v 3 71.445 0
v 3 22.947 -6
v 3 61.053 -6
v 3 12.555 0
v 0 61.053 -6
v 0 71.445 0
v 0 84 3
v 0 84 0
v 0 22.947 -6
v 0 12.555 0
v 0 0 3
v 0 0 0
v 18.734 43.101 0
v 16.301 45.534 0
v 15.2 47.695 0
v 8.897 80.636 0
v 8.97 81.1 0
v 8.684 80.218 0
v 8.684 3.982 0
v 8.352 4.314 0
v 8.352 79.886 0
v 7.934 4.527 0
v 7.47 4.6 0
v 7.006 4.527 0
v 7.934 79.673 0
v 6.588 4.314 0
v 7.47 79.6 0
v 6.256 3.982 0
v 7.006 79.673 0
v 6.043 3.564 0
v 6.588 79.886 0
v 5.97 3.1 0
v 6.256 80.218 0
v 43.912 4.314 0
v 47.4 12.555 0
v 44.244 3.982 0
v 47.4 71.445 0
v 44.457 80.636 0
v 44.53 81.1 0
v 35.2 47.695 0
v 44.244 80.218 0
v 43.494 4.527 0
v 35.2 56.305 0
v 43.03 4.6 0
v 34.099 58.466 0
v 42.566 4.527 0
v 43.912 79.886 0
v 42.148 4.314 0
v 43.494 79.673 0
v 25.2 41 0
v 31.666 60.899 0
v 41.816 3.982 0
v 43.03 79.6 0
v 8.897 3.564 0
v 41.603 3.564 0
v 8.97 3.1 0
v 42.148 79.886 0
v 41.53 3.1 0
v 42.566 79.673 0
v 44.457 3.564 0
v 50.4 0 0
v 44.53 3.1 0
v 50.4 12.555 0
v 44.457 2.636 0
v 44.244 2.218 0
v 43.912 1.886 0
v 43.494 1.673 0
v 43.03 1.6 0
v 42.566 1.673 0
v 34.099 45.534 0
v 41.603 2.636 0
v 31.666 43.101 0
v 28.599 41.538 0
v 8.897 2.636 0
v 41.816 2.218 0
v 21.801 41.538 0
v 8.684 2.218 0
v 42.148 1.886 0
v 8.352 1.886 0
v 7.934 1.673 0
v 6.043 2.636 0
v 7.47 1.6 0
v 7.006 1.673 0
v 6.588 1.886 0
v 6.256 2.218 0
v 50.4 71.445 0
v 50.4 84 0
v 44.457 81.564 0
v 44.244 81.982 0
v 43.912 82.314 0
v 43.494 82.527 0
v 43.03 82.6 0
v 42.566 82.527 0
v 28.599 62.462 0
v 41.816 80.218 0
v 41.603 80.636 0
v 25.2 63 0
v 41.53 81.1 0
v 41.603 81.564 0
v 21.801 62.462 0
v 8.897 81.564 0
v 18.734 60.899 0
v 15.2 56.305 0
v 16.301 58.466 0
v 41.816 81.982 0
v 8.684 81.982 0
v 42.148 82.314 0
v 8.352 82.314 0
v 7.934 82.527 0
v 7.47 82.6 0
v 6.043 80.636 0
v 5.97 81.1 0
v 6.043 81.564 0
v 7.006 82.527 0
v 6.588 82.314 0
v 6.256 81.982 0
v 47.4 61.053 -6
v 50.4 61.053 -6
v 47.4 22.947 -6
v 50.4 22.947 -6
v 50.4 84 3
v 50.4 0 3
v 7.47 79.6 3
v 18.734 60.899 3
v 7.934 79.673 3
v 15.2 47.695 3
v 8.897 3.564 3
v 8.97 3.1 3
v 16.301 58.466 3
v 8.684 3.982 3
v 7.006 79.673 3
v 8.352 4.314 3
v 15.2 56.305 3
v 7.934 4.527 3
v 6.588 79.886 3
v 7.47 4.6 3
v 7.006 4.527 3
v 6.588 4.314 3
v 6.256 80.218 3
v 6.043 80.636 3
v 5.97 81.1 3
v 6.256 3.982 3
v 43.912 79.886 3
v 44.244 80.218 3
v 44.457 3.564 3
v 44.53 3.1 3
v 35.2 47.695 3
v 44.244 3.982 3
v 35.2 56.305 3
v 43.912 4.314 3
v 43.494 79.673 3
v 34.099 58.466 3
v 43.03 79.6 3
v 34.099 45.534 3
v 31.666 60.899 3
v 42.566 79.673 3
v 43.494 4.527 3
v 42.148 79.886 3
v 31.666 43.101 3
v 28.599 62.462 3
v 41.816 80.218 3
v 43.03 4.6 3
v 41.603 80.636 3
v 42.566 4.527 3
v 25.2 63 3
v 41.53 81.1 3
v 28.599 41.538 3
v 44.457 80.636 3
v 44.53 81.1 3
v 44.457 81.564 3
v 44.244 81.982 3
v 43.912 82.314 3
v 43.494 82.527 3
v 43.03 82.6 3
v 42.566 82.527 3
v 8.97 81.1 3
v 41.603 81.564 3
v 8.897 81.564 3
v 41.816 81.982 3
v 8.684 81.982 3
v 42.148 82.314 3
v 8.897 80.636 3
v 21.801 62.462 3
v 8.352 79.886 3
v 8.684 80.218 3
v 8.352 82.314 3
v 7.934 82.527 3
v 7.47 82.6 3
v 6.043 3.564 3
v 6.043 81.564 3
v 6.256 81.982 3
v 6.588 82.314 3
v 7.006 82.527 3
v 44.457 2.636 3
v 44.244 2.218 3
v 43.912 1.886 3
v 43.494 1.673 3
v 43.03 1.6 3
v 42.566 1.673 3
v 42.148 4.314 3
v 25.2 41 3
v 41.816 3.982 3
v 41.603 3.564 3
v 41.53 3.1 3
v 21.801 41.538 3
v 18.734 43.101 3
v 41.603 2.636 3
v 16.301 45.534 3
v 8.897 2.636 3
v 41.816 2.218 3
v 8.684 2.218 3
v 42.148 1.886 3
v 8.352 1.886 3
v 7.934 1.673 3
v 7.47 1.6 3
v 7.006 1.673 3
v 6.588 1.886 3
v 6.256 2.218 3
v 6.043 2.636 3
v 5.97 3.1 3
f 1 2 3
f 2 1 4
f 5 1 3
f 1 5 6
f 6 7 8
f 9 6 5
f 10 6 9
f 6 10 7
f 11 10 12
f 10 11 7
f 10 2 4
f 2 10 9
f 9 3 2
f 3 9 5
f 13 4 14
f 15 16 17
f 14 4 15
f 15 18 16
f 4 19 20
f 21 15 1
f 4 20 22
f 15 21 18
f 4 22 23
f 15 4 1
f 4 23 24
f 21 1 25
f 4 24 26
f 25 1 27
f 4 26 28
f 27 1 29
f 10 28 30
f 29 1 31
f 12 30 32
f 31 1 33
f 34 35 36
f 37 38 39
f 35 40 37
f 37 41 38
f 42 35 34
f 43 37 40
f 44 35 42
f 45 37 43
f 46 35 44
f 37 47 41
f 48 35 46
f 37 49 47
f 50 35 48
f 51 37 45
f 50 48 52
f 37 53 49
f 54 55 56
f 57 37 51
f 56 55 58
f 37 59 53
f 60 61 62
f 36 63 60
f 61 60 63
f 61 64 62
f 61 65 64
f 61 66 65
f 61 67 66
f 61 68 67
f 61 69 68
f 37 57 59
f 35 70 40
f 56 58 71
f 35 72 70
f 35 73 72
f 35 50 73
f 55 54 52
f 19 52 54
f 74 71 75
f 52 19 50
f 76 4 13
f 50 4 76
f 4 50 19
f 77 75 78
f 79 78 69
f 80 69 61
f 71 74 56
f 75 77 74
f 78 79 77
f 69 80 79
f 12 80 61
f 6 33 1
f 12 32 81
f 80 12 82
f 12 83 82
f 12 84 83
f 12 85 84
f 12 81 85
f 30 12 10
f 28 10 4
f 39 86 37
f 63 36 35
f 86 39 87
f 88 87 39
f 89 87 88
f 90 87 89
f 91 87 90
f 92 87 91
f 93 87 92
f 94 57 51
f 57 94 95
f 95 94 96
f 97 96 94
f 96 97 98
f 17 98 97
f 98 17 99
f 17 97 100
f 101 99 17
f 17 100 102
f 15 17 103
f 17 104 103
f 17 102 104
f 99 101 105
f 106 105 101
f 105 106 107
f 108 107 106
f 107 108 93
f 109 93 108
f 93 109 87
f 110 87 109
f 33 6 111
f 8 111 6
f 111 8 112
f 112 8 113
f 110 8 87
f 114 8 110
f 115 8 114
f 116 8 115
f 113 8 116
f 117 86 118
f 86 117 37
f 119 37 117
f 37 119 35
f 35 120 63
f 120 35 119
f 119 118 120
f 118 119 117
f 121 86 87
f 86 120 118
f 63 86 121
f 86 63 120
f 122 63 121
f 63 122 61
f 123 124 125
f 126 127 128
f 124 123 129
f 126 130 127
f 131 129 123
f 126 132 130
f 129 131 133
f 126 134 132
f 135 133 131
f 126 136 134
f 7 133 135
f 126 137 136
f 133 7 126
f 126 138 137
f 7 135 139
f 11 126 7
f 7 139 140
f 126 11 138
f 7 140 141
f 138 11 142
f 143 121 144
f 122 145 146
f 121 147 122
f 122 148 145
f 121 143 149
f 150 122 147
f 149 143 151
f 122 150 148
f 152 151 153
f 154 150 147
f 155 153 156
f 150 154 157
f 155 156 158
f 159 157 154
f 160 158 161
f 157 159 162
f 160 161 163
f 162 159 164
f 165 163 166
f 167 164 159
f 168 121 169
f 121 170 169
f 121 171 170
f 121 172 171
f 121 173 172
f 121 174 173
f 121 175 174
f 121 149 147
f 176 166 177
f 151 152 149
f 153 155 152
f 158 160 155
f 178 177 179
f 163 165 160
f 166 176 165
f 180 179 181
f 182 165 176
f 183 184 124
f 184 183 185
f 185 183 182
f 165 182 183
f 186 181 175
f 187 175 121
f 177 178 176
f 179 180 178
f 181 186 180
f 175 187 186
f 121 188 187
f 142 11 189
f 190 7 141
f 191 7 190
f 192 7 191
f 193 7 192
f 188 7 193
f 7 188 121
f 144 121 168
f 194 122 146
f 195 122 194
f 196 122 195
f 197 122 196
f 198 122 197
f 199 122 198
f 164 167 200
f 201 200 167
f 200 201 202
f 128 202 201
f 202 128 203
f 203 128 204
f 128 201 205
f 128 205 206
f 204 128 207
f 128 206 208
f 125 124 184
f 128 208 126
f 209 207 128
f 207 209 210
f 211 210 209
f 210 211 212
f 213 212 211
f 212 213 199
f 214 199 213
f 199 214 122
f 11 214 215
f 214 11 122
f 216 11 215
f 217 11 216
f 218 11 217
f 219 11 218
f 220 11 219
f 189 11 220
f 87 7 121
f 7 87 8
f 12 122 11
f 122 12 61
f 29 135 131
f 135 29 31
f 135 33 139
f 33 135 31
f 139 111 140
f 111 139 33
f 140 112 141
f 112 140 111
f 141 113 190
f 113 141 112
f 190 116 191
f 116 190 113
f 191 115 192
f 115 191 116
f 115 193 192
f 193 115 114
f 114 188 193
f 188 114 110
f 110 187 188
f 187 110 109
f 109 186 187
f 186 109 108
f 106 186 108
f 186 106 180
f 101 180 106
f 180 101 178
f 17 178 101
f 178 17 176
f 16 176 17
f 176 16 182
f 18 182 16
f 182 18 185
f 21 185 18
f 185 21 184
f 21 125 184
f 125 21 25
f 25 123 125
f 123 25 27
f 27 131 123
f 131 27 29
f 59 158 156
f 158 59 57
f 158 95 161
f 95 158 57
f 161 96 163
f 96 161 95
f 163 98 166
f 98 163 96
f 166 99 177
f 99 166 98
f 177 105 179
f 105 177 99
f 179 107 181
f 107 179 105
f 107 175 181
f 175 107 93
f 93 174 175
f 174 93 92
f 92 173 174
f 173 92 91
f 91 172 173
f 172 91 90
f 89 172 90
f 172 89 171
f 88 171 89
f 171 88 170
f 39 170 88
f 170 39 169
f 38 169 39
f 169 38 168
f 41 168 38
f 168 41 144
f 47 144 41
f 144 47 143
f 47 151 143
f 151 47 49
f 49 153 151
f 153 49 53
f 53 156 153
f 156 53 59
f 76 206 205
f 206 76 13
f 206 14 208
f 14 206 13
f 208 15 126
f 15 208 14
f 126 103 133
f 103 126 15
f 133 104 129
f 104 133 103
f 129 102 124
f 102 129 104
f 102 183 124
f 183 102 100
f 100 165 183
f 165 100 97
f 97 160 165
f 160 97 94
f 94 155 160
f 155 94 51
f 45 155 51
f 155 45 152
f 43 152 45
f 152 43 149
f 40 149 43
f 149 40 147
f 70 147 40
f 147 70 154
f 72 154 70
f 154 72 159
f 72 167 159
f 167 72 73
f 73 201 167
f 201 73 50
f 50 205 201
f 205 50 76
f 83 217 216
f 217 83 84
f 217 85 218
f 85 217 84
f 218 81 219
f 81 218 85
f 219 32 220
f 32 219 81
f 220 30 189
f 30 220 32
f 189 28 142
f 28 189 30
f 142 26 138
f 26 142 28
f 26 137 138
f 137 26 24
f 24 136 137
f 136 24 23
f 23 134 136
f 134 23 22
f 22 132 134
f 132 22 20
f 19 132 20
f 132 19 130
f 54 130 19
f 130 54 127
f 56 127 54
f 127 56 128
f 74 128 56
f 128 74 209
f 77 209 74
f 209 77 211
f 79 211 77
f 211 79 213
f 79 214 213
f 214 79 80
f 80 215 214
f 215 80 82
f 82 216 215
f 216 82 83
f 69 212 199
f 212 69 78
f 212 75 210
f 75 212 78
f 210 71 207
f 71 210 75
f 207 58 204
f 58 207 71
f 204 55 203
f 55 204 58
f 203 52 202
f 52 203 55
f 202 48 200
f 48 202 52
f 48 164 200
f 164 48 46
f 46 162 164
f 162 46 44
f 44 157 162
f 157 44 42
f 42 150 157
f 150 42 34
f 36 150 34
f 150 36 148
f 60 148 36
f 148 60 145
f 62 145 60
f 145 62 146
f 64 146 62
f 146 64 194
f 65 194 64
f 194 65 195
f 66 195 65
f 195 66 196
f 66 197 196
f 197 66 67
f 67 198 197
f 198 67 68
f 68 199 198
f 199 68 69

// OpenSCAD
// file: panel.scad
$fn = 20;
U = 3;
T = 16;

h = U * 44.5 - 5;
w = T * 5.08 - 2*.2;

m_x = 7.47;
//m_x = 0;
m_y = 3.1;
m_d = 3;

F = U * 44.5 + (122.5 - 3 * 44.5);

echo(w);

module hole() {
//    hull() {
    circle(d=m_d);
//    translate([5.08/2,0]) circle(d=m_d);
//    }
}

module holes() {
    translate([m_x, m_y]) hole();
    translate([m_x, m_y + F]) hole();
}

module panel() {
    difference() {
    square([w, h]);
        holes();
        if(T>6) {
            translate([(T-3) * 5.08, 0]) holes();
        }
        translate([(T-24) * 5.08, 0]) holes();
    }
}

//panel();

//#square([46,62]);
//#import("jr-module-bay-cover.stl");
// main file
b_w = 13;
b_h = 20;

include <panel.scad>

T=10;
U=2;

difference() {
    linear_extrude(3)
    difference() {
    panel();
        translate([w/2,h/2+10])
        intersection() {
            circle(d=22, true);
            square([20,22],true);
        }
    }
}

intersection() {
    translate([0,h/2,25])
    rotate([0,90,0])
    linear_extrude(3)
    circle(d=h, $fn=6);
    
    translate([0,0,-6])
    linear_extrude(6)
    panel(); 
}

intersection() {
    translate([w-3,h/2,25])
    rotate([0,90,0])
    linear_extrude(3)
    circle(d=h, $fn=6);
    
    translate([0,0,-6])
    linear_extrude(6)
    panel(); 
}
